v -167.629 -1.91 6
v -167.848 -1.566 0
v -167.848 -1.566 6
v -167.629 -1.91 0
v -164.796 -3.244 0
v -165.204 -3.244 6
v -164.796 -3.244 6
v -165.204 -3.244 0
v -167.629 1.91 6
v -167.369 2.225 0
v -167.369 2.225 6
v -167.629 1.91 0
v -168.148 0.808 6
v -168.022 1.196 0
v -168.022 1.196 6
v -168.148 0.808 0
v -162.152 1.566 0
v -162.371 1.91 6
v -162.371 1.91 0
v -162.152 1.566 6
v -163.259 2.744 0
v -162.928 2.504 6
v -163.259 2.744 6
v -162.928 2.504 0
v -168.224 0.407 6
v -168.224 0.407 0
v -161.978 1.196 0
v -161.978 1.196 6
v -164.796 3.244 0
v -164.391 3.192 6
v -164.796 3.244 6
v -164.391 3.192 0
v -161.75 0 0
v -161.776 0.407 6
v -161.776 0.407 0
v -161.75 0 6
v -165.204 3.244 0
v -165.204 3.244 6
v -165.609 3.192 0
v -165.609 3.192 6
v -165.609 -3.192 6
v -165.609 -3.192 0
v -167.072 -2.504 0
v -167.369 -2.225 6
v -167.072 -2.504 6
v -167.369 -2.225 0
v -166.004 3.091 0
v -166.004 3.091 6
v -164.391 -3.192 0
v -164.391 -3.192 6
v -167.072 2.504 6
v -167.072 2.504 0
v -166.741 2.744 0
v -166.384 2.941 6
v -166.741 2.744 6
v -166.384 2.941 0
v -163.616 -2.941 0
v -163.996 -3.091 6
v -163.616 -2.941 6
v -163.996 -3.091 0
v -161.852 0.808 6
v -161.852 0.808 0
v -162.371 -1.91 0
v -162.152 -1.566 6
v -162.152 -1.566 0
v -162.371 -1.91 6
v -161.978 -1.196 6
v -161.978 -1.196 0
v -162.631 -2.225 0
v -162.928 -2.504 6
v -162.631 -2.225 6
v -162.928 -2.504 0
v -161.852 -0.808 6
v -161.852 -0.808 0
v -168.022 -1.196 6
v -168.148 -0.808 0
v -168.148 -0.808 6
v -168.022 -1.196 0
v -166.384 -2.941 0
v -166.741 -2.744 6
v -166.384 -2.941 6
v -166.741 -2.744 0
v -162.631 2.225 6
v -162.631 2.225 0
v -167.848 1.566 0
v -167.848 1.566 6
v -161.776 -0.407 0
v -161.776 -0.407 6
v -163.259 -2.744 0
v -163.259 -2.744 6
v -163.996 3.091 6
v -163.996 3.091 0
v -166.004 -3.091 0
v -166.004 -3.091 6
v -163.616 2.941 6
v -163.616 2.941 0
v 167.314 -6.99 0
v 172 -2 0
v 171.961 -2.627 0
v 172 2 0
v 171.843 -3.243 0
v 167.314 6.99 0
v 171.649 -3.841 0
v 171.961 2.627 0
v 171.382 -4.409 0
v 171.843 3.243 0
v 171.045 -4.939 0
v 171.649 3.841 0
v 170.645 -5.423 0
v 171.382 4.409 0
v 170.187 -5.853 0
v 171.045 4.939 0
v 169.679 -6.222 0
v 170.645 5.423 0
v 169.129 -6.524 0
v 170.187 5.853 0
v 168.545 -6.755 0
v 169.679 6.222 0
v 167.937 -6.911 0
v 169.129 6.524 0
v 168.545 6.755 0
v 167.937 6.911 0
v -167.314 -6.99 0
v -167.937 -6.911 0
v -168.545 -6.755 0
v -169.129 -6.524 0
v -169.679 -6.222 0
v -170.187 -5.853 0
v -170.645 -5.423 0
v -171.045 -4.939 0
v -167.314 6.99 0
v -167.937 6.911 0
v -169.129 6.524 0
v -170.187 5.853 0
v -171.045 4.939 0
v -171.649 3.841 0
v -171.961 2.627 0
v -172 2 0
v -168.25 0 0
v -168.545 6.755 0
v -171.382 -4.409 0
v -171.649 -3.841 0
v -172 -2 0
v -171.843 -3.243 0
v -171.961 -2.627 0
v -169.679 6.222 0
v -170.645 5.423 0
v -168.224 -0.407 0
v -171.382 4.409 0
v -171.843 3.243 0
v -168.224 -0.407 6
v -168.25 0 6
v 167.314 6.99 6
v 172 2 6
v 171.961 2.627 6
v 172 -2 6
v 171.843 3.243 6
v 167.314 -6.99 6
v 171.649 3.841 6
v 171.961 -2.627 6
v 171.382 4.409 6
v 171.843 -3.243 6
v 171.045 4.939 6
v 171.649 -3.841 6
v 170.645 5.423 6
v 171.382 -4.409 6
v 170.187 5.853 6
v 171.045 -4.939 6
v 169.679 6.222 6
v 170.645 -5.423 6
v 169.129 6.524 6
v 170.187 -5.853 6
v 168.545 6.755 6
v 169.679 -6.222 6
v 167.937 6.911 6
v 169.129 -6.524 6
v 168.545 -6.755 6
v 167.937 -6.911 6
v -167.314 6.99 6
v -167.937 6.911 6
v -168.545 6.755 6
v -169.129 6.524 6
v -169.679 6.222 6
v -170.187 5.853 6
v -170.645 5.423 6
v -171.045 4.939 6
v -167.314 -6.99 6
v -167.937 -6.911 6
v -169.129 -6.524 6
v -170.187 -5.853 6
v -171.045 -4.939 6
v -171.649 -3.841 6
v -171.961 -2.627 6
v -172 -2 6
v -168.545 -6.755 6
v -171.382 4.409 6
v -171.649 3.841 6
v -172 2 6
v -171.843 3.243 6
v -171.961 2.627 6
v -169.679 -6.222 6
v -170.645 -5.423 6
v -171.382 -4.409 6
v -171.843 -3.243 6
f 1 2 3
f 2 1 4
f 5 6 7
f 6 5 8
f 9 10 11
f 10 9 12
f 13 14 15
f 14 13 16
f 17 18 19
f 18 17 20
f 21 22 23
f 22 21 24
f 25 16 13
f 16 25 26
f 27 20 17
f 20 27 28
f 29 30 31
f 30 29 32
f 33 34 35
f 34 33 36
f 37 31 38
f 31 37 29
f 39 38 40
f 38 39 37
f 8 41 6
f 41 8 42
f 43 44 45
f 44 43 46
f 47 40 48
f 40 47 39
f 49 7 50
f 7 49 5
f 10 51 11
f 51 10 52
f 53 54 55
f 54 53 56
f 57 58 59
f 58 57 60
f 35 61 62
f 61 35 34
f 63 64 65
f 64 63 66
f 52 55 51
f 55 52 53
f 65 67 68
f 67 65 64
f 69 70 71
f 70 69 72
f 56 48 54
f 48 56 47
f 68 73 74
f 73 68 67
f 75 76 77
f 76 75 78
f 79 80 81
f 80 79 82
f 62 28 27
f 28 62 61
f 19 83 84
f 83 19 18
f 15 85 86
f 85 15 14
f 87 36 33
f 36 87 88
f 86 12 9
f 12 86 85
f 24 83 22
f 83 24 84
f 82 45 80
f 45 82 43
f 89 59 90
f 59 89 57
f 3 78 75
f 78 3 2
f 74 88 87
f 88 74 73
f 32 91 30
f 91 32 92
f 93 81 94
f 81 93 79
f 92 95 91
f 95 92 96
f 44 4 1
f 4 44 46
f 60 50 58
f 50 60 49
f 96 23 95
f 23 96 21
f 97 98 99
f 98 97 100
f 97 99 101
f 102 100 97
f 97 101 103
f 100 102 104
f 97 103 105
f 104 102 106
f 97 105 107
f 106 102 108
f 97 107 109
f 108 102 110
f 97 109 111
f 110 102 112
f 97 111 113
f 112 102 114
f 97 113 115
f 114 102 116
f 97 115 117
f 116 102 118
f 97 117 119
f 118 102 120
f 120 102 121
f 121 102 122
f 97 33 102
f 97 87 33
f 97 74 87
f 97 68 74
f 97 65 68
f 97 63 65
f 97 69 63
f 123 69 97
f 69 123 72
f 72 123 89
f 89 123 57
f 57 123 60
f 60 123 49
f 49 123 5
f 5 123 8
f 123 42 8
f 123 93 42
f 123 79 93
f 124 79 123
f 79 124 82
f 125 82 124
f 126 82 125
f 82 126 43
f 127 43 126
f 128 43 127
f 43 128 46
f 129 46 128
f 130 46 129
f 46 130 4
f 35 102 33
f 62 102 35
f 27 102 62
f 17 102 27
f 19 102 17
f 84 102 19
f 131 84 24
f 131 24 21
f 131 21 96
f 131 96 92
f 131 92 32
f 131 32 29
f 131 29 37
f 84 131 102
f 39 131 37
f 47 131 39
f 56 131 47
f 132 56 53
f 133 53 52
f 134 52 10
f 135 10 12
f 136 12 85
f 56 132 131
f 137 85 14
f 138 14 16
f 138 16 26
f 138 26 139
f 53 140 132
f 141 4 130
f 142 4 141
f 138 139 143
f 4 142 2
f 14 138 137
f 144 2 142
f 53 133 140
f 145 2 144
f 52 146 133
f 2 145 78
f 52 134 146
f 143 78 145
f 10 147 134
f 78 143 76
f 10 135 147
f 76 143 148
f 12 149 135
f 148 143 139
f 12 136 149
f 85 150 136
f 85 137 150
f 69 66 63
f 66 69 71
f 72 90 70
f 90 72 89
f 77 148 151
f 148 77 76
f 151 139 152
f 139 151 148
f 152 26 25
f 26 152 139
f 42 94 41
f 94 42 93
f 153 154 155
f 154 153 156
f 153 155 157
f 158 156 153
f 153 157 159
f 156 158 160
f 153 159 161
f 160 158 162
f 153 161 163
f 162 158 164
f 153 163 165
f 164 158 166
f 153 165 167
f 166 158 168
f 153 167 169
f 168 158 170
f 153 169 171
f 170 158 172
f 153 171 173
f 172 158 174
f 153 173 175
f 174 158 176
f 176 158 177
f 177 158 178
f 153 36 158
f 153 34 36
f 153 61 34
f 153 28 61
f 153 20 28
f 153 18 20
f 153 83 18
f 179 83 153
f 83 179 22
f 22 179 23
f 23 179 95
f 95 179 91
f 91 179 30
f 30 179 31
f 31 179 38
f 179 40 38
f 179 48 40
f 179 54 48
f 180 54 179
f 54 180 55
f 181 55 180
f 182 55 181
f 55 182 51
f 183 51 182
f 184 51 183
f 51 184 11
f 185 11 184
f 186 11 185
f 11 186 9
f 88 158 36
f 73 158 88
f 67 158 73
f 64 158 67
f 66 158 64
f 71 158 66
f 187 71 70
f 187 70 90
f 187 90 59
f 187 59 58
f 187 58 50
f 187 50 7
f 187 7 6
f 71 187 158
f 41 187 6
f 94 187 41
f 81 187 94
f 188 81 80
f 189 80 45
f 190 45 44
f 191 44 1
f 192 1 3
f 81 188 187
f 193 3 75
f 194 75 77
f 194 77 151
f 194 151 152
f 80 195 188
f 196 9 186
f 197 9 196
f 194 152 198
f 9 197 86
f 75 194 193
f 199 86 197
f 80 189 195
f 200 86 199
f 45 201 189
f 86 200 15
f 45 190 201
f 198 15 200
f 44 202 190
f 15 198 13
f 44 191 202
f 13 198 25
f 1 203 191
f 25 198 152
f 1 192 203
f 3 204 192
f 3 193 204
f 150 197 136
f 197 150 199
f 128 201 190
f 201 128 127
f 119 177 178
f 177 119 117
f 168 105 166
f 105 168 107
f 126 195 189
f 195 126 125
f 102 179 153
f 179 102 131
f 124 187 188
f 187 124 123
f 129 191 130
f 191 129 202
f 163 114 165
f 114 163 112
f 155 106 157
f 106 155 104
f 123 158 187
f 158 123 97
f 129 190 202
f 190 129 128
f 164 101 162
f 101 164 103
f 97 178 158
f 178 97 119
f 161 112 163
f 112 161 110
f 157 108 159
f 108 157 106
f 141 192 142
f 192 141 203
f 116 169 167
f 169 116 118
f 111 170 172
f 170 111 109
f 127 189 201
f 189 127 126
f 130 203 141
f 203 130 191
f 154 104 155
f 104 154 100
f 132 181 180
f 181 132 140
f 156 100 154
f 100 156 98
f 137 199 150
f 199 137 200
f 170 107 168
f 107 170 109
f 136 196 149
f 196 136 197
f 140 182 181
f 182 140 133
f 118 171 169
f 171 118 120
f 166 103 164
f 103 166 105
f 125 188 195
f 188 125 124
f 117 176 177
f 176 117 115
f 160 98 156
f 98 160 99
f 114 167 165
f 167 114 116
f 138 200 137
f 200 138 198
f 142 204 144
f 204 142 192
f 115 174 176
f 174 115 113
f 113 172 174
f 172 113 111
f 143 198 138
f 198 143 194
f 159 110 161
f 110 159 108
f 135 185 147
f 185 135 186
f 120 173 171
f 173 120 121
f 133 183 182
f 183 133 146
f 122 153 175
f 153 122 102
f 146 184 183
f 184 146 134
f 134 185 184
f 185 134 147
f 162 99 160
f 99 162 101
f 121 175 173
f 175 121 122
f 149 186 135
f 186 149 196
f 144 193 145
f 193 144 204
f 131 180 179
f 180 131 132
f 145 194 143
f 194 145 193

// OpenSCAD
$fn = 50;


difference() {
	union() {
		hull() {
			translate(v = [-167.0000000000, 2.0000000000, 0]) {
				cylinder(h = 6, r = 5);
			}
			translate(v = [167.0000000000, 2.0000000000, 0]) {
				cylinder(h = 6, r = 5);
			}
			translate(v = [-167.0000000000, -2.0000000000, 0]) {
				cylinder(h = 6, r = 5);
			}
			translate(v = [167.0000000000, -2.0000000000, 0]) {
				cylinder(h = 6, r = 5);
			}
		}
	}
	union() {
		translate(v = [-165.0000000000, 0.0000000000, 0]) {
			cylinder(h = 6, r = 3.2500000000);
		}
		translate(v = [-165.0000000000, 0.0000000000, 0]) {
			cylinder(h = 6, r = 1.8000000000);
		}
		translate(v = [-165.0000000000, 0.0000000000, 0]) {
			cylinder(h = 6, r = 1.8000000000);
		}
		translate(v = [-165.0000000000, 0.0000000000, 0]) {
			cylinder(h = 6, r = 1.8000000000);
		}
	}
}
